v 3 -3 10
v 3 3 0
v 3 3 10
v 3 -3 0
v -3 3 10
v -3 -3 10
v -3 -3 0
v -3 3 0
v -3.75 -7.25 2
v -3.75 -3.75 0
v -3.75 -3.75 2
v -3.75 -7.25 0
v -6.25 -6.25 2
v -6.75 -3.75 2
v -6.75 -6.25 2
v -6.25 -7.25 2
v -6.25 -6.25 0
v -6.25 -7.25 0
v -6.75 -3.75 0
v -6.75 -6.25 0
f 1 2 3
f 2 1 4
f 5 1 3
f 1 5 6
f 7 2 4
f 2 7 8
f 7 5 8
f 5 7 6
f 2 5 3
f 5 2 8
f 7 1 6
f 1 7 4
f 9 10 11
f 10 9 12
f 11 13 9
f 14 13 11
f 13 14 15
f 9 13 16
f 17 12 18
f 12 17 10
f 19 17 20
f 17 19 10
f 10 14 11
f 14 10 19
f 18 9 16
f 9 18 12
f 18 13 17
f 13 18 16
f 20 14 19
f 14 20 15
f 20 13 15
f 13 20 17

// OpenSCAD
translate([0, 0, 5]) color([0,1,0,0.9]) cube([6, 6, 10], center=true);
translate([-4.0, -4.0, 1]) color([1,0,0]) cube([0.5, 0.5, 2], center=true);
translate([-4.0, -4.5, 1]) color([1,0,0]) cube([0.5, 0.5, 2], center=true);
translate([-4.0, -5.0, 1]) color([1,0,0]) cube([0.5, 0.5, 2], center=true);
translate([-4.0, -5.5, 1]) color([1,0,0]) cube([0.5, 0.5, 2], center=true);
translate([-4.0, -6.0, 1]) color([1,0,0]) cube([0.5, 0.5, 2], center=true);
translate([-4.0, -6.5, 1]) color([1,0,0]) cube([0.5, 0.5, 2], center=true);
translate([-4.0, -7.0, 1]) color([1,0,0]) cube([0.5, 0.5, 2], center=true);
translate([-4.5, -4.0, 1]) color([1,0,0]) cube([0.5, 0.5, 2], center=true);
translate([-4.5, -4.5, 1]) color([1,0,0]) cube([0.5, 0.5, 2], center=true);
translate([-4.5, -5.0, 1]) color([1,0,0]) cube([0.5, 0.5, 2], center=true);
translate([-4.5, -5.5, 1]) color([1,0,0]) cube([0.5, 0.5, 2], center=true);
translate([-4.5, -6.0, 1]) color([1,0,0]) cube([0.5, 0.5, 2], center=true);
translate([-4.5, -6.5, 1]) color([1,0,0]) cube([0.5, 0.5, 2], center=true);
translate([-4.5, -7.0, 1]) color([1,0,0]) cube([0.5, 0.5, 2], center=true);
translate([-5.0, -4.0, 1]) color([1,0,0]) cube([0.5, 0.5, 2], center=true);
translate([-5.0, -4.5, 1]) color([1,0,0]) cube([0.5, 0.5, 2], center=true);
translate([-5.0, -5.0, 1]) color([1,0,0]) cube([0.5, 0.5, 2], center=true);
translate([-5.0, -5.5, 1]) color([1,0,0]) cube([0.5, 0.5, 2], center=true);
translate([-5.0, -6.0, 1]) color([1,0,0]) cube([0.5, 0.5, 2], center=true);
translate([-5.0, -6.5, 1]) color([1,0,0]) cube([0.5, 0.5, 2], center=true);
translate([-5.0, -7.0, 1]) color([1,0,0]) cube([0.5, 0.5, 2], center=true);
translate([-5.5, -4.0, 1]) color([1,0,0]) cube([0.5, 0.5, 2], center=true);
translate([-5.5, -4.5, 1]) color([1,0,0]) cube([0.5, 0.5, 2], center=true);
translate([-5.5, -5.0, 1]) color([1,0,0]) cube([0.5, 0.5, 2], center=true);
translate([-5.5, -5.5, 1]) color([1,0,0]) cube([0.5, 0.5, 2], center=true);
translate([-5.5, -6.0, 1]) color([1,0,0]) cube([0.5, 0.5, 2], center=true);
translate([-5.5, -6.5, 1]) color([1,0,0]) cube([0.5, 0.5, 2], center=true);
translate([-5.5, -7.0, 1]) color([1,0,0]) cube([0.5, 0.5, 2], center=true);
translate([-6.0, -4.0, 1]) color([1,0,0]) cube([0.5, 0.5, 2], center=true);
translate([-6.0, -4.5, 1]) color([1,0,0]) cube([0.5, 0.5, 2], center=true);
translate([-6.0, -5.0, 1]) color([1,0,0]) cube([0.5, 0.5, 2], center=true);
translate([-6.0, -5.5, 1]) color([1,0,0]) cube([0.5, 0.5, 2], center=true);
translate([-6.0, -6.0, 1]) color([1,0,0]) cube([0.5, 0.5, 2], center=true);
translate([-6.0, -6.5, 1]) color([1,0,0]) cube([0.5, 0.5, 2], center=true);
translate([-6.0, -7.0, 1]) color([1,0,0]) cube([0.5, 0.5, 2], center=true);
translate([-6.5, -4.0, 1]) color([1,0,0]) cube([0.5, 0.5, 2], center=true);
translate([-6.5, -4.5, 1]) color([1,0,0]) cube([0.5, 0.5, 2], center=true);
translate([-6.5, -5.0, 1]) color([1,0,0]) cube([0.5, 0.5, 2], center=true);
translate([-6.5, -5.5, 1]) color([1,0,0]) cube([0.5, 0.5, 2], center=true);
translate([-6.5, -6.0, 1]) color([1,0,0]) cube([0.5, 0.5, 2], center=true);
